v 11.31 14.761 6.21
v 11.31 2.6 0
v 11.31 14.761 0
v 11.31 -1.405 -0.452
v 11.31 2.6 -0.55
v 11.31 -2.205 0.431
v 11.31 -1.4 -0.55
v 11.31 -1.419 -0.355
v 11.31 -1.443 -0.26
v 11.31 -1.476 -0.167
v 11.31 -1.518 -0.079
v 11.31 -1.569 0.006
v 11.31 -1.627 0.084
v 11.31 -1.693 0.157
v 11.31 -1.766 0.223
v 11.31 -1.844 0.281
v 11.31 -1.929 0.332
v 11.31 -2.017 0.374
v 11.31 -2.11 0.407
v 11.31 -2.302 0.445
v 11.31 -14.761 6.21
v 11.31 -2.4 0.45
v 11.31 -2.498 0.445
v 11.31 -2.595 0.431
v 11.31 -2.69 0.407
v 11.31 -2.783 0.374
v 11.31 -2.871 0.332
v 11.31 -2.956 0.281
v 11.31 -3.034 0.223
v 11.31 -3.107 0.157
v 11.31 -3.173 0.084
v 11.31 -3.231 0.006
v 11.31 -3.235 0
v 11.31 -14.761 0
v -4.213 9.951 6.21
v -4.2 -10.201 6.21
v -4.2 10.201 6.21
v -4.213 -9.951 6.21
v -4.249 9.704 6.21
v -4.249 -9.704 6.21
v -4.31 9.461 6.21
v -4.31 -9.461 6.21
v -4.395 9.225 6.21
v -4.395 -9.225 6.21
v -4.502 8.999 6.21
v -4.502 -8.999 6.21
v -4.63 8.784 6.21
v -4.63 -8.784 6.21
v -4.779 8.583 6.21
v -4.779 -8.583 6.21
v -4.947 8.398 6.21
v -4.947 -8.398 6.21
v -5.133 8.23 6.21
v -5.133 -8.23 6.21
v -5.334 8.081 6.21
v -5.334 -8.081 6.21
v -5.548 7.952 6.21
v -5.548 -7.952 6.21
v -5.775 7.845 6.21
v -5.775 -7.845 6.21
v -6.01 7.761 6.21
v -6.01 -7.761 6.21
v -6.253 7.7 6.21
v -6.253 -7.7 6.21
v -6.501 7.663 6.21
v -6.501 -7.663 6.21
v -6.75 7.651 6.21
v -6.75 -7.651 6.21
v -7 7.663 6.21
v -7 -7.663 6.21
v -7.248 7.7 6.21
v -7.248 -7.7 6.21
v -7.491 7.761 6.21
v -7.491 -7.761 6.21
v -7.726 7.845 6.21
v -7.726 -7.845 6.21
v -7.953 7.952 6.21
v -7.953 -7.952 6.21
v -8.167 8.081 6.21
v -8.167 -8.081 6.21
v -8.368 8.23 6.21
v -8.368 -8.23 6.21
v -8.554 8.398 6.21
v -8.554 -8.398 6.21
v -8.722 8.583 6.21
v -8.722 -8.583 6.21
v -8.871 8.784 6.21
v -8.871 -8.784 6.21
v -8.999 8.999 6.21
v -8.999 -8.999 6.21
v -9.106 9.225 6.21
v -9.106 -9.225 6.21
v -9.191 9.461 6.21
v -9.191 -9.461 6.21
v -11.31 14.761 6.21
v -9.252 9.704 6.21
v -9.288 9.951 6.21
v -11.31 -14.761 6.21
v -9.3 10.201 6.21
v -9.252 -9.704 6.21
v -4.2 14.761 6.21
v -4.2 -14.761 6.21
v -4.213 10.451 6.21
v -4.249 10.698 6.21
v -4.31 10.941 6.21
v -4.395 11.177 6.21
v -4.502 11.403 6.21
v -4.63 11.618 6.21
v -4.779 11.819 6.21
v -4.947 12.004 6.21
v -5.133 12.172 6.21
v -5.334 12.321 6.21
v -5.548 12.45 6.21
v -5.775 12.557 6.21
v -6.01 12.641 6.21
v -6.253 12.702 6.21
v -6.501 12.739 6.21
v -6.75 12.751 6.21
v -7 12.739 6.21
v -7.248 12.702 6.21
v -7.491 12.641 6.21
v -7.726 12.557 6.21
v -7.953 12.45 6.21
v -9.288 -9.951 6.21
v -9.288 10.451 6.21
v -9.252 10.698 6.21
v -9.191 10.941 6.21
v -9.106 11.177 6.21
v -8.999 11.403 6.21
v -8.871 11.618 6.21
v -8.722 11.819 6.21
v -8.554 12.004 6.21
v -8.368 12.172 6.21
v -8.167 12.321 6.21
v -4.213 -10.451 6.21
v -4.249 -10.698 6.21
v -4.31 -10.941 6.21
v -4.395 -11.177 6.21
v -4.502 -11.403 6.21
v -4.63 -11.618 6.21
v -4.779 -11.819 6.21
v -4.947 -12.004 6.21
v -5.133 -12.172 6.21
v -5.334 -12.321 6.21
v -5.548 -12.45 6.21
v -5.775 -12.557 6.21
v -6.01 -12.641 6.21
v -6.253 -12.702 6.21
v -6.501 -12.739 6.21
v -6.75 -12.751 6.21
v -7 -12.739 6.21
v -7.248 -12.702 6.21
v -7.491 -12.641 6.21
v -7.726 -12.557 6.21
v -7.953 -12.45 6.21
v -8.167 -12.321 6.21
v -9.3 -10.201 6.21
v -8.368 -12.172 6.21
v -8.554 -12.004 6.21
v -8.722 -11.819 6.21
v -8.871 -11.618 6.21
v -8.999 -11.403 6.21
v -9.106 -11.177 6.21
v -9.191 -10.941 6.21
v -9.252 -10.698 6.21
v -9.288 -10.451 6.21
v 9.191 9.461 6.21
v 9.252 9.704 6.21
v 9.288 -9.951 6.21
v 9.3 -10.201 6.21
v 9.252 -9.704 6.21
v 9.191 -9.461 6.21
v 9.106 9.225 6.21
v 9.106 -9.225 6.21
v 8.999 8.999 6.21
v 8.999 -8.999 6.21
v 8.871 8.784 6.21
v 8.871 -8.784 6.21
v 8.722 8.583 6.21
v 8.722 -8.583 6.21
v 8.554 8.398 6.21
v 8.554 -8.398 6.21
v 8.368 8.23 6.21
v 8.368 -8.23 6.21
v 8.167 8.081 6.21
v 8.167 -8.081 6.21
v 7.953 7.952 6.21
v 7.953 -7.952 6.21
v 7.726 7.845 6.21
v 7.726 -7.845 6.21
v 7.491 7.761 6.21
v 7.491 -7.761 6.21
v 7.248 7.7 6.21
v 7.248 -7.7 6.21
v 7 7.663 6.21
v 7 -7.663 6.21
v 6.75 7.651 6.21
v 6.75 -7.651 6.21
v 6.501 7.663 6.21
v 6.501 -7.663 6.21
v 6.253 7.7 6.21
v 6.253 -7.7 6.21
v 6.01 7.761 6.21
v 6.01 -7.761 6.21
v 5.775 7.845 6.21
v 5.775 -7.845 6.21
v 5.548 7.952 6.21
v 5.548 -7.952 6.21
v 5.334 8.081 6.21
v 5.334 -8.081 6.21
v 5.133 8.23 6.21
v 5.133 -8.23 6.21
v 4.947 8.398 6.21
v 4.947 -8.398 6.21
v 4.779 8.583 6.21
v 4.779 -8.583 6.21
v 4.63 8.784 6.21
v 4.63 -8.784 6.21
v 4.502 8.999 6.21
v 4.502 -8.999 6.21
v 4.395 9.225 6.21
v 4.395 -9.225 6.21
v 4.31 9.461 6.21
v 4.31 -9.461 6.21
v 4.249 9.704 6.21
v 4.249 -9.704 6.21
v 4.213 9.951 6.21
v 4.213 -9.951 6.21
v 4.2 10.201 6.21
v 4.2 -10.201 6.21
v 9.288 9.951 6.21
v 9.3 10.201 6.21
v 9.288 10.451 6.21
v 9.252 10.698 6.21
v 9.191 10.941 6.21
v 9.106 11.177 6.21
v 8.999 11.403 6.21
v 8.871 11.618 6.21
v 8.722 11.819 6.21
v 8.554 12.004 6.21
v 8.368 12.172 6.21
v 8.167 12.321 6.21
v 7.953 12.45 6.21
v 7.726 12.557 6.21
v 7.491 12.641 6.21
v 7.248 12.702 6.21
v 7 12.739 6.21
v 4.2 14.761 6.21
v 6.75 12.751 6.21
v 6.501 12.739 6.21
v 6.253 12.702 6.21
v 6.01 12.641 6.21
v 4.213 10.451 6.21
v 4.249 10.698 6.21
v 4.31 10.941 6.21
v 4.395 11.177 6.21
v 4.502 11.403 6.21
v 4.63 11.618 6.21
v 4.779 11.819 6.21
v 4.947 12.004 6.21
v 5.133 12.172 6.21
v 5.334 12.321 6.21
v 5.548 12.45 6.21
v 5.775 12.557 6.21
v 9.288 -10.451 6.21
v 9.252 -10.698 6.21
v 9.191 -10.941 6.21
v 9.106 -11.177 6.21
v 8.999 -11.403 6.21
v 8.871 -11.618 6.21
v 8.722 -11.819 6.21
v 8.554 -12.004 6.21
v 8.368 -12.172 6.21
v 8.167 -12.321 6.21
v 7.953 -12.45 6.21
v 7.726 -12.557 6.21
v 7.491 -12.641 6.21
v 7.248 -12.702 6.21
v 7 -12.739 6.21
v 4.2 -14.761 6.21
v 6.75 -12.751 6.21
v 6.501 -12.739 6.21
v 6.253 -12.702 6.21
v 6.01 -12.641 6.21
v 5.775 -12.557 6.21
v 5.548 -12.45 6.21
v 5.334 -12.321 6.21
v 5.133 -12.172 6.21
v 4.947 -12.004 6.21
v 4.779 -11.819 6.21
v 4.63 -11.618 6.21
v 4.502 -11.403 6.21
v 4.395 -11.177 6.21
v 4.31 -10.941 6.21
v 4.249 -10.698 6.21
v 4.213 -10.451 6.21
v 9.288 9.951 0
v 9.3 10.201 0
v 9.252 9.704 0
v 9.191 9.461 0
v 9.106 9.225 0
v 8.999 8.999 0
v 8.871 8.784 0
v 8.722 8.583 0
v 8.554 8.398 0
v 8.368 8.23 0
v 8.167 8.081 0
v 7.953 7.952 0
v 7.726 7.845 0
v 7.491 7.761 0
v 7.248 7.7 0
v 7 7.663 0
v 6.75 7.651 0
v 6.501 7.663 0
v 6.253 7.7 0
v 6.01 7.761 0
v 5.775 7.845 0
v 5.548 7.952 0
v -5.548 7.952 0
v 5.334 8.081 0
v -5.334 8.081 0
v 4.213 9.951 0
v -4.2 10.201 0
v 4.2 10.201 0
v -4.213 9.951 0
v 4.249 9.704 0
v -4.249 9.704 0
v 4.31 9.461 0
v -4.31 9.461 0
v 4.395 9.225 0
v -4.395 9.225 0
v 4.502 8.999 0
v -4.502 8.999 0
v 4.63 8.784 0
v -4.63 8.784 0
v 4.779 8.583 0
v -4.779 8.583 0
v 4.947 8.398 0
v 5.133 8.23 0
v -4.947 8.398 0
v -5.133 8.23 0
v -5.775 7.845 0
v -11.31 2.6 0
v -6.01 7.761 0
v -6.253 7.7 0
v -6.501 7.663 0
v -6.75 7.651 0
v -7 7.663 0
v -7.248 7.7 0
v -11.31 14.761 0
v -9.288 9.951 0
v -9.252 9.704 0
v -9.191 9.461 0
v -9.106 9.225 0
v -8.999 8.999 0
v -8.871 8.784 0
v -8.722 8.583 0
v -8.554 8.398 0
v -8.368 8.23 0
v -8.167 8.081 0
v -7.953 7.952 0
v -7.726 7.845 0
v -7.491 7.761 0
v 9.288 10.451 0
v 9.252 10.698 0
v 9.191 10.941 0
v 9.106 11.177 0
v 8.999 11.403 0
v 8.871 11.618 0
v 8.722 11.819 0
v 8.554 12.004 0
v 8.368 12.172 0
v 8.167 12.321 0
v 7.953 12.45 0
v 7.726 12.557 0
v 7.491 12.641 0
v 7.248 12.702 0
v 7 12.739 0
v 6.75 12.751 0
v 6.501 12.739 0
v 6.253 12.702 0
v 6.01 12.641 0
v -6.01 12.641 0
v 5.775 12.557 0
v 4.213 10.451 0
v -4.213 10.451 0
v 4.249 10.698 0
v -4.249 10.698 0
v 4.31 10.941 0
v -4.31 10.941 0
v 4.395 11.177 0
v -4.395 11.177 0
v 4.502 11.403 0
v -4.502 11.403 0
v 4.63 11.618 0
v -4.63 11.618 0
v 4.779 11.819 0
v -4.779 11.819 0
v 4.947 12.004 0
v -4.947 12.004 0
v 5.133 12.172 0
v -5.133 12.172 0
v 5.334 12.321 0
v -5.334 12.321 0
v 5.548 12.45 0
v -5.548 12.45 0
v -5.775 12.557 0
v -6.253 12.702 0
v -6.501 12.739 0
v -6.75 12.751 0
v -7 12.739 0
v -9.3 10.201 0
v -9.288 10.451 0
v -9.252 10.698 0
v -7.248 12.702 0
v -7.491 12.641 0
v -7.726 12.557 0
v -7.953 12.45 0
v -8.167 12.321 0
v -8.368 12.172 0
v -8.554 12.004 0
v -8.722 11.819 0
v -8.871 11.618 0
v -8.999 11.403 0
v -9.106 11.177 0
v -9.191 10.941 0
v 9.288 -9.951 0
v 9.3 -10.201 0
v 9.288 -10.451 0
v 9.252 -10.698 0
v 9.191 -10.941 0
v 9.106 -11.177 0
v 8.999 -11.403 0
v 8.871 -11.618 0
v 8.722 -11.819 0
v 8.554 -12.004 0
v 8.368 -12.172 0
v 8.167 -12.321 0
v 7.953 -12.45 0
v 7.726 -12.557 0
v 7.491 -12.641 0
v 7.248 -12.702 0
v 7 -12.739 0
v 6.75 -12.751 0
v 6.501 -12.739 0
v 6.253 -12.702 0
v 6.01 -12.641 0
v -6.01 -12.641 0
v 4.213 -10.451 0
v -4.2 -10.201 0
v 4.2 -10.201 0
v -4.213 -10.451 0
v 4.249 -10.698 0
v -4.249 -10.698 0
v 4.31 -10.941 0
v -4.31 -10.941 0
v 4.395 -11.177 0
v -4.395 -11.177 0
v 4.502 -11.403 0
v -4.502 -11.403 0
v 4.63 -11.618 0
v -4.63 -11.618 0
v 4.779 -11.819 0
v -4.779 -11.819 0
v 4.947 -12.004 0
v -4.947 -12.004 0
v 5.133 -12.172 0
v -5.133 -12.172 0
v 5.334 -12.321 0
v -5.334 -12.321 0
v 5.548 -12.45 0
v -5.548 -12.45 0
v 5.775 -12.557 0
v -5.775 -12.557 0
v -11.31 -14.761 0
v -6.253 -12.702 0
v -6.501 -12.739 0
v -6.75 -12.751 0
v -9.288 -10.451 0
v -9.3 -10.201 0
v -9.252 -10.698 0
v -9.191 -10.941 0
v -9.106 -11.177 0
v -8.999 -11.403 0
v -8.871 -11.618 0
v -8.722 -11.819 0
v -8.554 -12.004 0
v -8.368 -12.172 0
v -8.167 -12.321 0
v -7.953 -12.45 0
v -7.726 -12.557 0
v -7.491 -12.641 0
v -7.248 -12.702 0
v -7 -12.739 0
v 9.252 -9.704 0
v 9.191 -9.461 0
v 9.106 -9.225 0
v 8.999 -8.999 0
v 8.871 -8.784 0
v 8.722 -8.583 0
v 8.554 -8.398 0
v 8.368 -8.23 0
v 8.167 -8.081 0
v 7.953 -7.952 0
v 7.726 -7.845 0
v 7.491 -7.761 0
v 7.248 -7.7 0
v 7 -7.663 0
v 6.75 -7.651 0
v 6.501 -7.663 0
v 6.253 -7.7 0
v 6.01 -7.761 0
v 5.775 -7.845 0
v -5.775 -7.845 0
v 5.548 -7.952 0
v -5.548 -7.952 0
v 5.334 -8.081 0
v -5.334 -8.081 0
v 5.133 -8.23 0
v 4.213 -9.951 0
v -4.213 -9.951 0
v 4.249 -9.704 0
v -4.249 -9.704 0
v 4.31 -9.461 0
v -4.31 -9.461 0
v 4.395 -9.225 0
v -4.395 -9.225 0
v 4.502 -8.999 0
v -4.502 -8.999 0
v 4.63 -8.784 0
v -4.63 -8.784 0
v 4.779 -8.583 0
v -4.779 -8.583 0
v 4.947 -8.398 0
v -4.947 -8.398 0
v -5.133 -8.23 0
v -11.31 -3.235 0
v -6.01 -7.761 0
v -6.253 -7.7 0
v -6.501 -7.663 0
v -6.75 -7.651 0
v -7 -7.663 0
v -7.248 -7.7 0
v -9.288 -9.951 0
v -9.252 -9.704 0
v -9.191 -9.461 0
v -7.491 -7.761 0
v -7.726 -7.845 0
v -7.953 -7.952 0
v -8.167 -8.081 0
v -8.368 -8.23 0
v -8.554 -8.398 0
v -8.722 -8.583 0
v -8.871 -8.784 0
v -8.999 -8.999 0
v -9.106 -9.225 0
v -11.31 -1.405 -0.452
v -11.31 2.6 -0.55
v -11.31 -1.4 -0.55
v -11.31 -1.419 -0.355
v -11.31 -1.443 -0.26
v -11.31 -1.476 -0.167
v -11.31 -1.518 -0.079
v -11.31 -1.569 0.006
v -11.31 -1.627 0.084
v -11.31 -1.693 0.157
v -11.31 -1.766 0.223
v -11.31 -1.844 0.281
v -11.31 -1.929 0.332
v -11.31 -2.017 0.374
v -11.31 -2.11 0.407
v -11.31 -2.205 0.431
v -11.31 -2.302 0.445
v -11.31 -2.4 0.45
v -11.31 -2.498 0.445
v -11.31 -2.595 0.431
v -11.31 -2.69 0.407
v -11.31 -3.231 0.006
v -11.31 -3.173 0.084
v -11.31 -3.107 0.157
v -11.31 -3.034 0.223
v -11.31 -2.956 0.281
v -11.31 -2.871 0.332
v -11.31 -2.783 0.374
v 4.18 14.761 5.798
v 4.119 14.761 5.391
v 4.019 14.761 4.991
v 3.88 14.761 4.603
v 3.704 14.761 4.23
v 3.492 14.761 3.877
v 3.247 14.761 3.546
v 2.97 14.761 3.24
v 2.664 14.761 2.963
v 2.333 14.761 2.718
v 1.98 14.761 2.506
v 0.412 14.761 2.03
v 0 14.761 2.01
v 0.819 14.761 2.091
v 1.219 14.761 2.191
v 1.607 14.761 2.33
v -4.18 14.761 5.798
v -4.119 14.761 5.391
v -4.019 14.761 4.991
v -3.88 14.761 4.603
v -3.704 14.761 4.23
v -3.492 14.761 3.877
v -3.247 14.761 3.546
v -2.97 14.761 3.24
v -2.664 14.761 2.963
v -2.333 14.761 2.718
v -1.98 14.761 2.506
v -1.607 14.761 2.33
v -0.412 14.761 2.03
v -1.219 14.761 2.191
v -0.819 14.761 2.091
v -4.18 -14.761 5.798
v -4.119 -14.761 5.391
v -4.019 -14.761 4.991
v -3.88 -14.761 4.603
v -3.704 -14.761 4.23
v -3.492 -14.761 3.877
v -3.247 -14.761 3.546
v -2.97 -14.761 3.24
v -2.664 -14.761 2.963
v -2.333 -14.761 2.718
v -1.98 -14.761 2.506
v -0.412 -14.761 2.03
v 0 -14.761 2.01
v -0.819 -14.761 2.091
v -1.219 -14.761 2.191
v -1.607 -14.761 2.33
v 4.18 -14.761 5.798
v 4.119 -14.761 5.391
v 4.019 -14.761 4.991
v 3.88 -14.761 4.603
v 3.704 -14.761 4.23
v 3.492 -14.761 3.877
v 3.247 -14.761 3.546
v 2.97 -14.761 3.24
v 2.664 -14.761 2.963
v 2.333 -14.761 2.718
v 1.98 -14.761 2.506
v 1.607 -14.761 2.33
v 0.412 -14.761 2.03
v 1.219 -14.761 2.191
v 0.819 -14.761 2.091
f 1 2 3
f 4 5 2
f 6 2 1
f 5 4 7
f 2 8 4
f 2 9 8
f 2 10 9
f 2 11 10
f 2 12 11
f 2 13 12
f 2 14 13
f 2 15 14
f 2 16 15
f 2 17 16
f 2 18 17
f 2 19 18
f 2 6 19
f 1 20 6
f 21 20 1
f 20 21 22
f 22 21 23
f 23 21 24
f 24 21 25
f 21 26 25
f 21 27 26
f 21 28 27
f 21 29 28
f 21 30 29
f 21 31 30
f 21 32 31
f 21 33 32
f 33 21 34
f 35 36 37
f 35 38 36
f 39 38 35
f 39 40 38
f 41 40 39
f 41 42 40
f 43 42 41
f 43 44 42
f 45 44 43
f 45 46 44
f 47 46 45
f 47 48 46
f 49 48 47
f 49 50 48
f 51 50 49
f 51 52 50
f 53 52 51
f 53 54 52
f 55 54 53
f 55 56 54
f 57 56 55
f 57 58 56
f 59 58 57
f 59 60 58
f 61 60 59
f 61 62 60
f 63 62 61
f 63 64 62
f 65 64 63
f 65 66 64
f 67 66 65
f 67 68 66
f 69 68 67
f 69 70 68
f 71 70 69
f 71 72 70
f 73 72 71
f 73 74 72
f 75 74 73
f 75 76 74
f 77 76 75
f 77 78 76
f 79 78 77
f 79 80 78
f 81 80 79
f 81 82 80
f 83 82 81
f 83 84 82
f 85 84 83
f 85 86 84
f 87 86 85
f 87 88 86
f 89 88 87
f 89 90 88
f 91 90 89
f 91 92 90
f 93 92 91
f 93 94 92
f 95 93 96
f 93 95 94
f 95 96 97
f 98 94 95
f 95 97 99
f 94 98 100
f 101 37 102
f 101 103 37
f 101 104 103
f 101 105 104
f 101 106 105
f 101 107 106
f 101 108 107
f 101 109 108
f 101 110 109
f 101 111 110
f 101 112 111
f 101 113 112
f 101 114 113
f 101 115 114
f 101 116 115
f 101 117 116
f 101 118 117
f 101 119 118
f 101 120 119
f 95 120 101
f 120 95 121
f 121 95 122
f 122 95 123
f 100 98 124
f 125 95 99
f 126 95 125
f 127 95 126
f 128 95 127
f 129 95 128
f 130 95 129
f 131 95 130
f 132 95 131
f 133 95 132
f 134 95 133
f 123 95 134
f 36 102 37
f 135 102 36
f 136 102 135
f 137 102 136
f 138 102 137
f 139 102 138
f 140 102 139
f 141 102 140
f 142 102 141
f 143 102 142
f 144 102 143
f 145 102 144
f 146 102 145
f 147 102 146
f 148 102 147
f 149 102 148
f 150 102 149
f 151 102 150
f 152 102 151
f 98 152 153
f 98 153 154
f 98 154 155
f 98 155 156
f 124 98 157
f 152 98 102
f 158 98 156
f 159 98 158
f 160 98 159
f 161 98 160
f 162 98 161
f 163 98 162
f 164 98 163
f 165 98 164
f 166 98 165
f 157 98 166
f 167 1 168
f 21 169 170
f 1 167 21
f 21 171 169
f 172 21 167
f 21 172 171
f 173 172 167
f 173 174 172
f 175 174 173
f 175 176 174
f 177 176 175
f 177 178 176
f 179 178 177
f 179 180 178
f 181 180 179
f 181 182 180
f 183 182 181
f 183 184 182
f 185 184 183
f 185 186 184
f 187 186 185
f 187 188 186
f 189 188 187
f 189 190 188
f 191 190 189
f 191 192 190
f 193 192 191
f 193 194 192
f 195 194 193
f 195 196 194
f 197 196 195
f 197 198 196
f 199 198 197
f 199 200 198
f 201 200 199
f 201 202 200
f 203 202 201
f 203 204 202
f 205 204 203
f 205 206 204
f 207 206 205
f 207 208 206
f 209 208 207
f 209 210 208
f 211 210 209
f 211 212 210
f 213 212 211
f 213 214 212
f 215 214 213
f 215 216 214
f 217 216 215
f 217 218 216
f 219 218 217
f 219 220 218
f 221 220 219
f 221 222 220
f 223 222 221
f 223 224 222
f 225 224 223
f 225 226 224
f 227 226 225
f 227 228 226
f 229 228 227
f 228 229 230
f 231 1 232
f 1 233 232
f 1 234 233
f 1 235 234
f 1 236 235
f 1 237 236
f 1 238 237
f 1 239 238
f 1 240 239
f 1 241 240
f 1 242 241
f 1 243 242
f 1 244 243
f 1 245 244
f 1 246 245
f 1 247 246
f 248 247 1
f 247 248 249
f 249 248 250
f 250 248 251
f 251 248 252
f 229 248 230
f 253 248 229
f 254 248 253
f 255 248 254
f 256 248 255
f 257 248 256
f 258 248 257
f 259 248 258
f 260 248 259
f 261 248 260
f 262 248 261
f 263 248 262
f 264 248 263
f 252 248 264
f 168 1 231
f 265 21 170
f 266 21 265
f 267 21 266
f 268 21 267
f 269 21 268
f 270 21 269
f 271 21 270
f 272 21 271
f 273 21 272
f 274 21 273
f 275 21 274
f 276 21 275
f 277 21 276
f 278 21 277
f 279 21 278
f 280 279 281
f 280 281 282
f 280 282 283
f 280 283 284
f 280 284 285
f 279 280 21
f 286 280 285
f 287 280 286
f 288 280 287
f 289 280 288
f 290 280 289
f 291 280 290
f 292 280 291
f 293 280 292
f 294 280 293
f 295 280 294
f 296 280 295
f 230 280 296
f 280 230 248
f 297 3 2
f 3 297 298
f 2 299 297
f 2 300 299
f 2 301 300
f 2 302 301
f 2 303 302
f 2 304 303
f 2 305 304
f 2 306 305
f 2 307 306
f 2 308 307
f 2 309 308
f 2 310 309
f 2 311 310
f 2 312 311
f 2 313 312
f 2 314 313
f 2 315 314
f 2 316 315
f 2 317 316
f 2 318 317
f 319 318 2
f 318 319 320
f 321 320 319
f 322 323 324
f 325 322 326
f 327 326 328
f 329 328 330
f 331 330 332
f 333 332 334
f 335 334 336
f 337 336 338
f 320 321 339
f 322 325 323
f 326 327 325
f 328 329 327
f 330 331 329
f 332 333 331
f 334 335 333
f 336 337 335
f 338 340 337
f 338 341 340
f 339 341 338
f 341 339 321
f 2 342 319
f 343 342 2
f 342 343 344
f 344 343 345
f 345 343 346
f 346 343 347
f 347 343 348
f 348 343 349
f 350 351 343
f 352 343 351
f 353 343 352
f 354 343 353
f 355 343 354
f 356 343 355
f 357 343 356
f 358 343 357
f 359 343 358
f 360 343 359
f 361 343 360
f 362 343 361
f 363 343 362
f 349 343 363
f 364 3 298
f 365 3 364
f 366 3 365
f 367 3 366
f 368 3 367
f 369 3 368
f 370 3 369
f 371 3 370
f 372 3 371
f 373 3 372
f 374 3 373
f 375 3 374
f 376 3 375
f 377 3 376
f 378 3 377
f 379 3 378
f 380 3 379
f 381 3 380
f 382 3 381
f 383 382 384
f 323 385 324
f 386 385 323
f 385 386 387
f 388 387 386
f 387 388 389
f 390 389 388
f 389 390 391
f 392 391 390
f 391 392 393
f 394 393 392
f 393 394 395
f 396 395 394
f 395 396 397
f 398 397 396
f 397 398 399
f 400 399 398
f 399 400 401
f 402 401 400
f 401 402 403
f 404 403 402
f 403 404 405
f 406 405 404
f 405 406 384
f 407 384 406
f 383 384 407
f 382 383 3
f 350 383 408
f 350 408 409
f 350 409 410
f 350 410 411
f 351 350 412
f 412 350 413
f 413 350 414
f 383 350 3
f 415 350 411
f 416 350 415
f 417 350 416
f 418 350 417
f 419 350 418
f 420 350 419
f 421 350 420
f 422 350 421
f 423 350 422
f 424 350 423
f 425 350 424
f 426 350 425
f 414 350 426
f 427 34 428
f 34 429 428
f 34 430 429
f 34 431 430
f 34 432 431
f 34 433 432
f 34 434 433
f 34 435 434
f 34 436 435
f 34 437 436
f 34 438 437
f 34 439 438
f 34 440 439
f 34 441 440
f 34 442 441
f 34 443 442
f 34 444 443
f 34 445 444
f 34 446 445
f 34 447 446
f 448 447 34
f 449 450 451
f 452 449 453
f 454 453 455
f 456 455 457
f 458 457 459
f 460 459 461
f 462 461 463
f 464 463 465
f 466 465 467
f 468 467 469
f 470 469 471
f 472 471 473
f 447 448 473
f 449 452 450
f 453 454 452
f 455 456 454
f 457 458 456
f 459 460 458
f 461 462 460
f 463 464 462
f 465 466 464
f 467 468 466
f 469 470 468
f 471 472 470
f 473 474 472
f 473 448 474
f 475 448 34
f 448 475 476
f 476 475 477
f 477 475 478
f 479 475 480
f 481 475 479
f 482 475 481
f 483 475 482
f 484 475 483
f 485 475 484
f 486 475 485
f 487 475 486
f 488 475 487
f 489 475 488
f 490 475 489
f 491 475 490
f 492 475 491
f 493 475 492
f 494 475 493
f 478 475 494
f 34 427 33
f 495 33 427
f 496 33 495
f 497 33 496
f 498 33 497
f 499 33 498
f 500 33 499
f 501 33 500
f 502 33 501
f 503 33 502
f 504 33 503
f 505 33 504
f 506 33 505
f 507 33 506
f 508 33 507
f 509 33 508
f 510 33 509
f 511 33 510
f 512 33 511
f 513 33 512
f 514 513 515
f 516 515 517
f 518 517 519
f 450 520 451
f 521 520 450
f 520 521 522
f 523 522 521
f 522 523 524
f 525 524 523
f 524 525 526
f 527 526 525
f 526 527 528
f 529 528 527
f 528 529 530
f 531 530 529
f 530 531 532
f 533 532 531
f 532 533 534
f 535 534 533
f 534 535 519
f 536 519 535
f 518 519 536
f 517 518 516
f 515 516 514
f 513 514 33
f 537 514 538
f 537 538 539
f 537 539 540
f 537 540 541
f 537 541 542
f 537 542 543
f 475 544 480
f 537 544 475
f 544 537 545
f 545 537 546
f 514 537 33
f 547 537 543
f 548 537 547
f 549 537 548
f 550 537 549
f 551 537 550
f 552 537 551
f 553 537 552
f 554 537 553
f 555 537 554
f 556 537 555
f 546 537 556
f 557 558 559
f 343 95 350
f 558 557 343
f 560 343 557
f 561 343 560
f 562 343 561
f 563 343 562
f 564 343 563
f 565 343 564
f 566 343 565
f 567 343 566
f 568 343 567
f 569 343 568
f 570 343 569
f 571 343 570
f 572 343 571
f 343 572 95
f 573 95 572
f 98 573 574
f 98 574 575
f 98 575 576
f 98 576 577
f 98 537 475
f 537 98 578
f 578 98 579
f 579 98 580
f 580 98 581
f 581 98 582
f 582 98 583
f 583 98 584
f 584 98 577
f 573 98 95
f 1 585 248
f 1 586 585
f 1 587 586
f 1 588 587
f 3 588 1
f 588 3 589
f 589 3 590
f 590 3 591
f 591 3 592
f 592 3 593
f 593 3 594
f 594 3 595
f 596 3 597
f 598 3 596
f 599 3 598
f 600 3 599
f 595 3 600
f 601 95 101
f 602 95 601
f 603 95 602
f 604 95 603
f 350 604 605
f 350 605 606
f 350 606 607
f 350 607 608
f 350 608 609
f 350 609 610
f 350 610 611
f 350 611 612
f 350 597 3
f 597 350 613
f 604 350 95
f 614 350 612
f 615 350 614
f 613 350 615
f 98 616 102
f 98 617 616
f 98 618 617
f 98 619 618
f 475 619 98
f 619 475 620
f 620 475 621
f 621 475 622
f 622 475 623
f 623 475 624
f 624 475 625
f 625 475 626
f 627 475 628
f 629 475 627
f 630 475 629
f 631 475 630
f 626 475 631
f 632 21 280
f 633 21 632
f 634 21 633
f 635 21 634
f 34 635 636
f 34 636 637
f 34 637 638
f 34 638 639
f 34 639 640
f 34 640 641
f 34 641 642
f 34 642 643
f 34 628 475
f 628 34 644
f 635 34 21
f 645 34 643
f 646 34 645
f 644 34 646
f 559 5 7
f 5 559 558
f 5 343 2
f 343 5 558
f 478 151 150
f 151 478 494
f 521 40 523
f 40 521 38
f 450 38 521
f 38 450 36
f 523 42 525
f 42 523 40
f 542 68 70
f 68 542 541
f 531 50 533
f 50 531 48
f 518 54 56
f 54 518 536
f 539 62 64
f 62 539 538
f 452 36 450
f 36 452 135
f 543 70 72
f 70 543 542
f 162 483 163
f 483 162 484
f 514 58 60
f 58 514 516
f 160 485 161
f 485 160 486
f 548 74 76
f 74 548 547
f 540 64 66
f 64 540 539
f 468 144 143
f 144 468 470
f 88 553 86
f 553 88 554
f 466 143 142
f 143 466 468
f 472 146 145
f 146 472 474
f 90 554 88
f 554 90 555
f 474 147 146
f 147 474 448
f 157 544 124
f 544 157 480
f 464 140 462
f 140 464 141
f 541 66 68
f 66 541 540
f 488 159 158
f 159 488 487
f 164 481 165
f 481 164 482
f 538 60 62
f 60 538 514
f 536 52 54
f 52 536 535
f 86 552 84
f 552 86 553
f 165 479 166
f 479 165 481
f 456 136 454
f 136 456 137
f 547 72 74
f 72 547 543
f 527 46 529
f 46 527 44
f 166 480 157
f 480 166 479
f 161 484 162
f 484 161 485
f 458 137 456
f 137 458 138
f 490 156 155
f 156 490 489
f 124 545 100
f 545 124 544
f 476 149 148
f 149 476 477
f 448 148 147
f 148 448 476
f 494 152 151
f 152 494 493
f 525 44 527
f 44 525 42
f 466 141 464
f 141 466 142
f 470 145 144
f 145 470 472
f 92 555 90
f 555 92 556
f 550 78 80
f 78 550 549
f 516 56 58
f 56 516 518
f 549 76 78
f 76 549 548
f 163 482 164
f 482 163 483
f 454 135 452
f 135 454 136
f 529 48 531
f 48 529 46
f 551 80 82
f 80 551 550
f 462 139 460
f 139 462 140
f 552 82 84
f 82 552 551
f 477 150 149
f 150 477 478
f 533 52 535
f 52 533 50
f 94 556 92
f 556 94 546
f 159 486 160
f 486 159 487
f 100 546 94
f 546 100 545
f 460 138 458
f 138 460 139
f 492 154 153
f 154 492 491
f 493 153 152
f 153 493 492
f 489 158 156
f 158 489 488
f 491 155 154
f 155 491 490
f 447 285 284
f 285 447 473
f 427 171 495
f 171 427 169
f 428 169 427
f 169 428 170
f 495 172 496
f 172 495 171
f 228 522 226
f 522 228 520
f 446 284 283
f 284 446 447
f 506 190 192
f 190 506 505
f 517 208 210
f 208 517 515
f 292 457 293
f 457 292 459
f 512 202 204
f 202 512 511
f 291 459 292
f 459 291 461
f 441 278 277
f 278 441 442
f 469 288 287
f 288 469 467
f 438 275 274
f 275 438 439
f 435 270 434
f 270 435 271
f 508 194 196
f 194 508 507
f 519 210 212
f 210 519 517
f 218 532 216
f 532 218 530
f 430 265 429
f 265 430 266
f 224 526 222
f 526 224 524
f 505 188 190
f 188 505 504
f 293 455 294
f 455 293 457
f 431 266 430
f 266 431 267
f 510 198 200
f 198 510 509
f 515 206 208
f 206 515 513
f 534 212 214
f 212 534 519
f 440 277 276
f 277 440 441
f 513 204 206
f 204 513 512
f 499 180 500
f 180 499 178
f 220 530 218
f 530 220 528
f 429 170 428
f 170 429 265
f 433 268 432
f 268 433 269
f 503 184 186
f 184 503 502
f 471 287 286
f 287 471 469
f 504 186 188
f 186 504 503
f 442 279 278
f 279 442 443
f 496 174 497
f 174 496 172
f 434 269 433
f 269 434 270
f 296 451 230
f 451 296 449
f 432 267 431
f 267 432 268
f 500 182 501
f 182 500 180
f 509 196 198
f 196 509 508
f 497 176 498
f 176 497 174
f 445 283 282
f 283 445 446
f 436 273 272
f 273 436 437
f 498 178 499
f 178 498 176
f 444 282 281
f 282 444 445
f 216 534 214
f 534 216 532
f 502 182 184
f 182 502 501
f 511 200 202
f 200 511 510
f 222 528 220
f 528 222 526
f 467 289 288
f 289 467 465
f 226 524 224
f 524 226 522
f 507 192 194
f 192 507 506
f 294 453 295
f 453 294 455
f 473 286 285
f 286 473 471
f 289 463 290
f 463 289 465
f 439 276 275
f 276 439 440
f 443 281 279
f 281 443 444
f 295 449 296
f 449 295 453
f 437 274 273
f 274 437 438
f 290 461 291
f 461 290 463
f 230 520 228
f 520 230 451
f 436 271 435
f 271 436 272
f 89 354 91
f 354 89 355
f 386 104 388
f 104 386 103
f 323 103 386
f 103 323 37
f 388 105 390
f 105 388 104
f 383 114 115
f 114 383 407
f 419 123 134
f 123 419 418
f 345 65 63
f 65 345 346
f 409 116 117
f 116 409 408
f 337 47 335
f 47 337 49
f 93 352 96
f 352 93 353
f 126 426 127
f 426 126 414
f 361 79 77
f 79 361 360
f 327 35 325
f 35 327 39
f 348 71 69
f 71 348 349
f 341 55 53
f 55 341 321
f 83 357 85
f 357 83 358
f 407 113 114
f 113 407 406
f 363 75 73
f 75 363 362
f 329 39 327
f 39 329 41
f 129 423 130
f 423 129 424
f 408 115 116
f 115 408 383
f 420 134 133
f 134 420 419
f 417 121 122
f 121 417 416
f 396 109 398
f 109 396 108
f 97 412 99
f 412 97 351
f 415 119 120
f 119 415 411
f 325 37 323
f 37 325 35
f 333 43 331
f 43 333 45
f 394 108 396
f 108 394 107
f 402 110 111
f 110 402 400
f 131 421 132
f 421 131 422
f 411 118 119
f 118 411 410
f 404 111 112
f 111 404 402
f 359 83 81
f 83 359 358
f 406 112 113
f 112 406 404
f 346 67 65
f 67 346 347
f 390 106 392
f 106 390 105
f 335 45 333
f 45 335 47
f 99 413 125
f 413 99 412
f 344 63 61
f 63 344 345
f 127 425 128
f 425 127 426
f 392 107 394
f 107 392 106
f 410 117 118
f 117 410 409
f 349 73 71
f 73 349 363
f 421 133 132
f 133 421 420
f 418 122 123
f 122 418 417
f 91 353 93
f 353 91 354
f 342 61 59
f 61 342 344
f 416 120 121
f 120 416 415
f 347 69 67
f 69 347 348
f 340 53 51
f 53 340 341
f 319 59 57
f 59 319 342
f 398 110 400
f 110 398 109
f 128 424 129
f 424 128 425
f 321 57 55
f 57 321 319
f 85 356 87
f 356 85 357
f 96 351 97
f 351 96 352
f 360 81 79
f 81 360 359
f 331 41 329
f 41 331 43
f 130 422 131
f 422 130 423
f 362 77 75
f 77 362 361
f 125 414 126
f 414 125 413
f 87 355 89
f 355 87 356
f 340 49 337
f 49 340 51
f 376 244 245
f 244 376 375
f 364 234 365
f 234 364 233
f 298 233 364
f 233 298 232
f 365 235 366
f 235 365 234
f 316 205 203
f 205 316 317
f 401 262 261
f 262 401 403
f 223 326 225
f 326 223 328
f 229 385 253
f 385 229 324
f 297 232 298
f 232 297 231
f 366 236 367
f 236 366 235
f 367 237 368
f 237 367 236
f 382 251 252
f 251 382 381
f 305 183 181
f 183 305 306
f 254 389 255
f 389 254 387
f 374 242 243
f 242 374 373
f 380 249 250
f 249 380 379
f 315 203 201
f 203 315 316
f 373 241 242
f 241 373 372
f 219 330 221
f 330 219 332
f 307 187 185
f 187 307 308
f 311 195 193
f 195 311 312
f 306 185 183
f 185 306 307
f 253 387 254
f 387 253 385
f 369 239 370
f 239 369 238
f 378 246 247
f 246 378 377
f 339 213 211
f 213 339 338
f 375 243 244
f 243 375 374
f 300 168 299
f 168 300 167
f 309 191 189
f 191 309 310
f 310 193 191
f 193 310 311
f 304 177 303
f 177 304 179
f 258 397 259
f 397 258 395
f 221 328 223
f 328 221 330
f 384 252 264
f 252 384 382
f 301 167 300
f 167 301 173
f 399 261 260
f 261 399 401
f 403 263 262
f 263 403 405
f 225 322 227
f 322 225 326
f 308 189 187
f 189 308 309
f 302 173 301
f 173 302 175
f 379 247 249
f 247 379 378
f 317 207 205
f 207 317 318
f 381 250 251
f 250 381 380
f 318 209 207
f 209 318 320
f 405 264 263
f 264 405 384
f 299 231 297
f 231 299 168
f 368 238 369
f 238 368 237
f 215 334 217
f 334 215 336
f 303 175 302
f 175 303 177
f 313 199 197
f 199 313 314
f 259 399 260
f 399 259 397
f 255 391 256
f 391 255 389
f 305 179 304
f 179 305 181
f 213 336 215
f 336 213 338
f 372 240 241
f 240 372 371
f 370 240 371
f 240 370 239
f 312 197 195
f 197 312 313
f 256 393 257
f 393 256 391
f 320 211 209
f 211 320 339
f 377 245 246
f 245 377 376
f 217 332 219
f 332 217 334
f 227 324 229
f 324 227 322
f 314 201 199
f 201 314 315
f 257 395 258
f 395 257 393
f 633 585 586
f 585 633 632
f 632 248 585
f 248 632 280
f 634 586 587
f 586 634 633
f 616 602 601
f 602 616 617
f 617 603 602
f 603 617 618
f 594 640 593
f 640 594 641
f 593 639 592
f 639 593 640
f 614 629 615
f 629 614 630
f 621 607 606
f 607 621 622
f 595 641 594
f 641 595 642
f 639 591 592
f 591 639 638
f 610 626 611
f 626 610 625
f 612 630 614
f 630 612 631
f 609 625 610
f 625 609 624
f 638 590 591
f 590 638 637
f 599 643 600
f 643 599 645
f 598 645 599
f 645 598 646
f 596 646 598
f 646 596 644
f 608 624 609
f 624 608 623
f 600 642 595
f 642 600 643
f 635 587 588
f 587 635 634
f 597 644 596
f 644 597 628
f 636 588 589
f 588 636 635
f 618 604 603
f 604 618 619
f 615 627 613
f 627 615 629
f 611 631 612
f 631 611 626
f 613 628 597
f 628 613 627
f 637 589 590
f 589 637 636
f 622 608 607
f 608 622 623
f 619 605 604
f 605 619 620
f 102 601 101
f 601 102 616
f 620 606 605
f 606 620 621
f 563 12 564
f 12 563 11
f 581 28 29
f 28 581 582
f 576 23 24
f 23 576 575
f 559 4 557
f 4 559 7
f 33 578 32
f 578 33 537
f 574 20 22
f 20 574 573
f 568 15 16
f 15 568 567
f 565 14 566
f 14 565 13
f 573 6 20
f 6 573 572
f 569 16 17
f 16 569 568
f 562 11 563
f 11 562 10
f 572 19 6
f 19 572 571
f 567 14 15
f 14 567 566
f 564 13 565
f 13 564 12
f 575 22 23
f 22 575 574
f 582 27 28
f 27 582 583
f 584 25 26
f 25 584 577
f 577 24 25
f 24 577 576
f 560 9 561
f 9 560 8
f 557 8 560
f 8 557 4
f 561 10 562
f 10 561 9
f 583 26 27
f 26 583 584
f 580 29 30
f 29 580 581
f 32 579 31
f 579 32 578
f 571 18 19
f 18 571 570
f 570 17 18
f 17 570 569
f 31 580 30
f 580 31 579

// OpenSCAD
// file: configuration.scad
/*
 * Igor Soares' parallel kinematic XY
 * Configuration
 * (C) 2014 by Ígor Bruno Pereira Soares
 *
 * This project is free: you can redistribute it and/or modify
 * it under the terms of the GNU General Public License as published by
 * the Free Software Foundation, either version 2 of the License, or
 * (at your option) any later version.
 *
 * This project is distributed in the hope that it will be useful,
 * but WITHOUT ANY WARRANTY; without even the implied warranty of
 * MERCHANTABILITY or FITNESS FOR A PARTICULAR PURPOSE.  See the
 * GNU General Public License for more details.
 *
 * You should have received a copy of the GNU General Public License
 * along with this project.  If not, see <http://www.gnu.org/licenses/>.
 */

LIGHT_WALL_WIDTH = 2.01;
WALL_WIDTH = 5.0;
VERTICAL_SUPPORT_WALL = 0.5;
HORIZONTAL_SUPPORT_WALL = 0.255;

BEARING_DIAMETER = 22.4;
BEARING_WIDTH = 7;
BEARING_SCREW_DIAMETER = 8.2;
BEARING_SCREW_NUT_WIDTH = 13;

LINEAR_BUSHING_DIAMETER = 15.3;
LINEAR_BUSHING_LEN = 24.4;
LINEAR_BUSHING_WALL = 1.0;

INNER_BEARING_SCREW_DISTANCE_TO_ROD = VERTICAL_SUPPORT_WALL;
INNER_BEARING_POS = 15;

SPACING_TO_BEARING = 18.0;
ROD_ACTUAL_DIAMETER = 8.0;
ROD_HOLE_DIAMETER = 8.4;

ROD_CLAMP_SCREW_DIAMETER = 4.8+ 0.3;
ROD_CLAMP_SCREW_NUT_WIDTH = 6.7;
ROD_CLAMP_SCREW_NUT_H = 3.5;
ROD_CLAMP_GAP = 1.0;

FRAME_ROD_DIAMETER = 8.4;
FRAME_VERTICE_WALL_WIDTH = 3.5;

WIRE_END_SCREW_DIAMETER = 4.8 + 0.3; // 3/16 + tolerance

MOTOR_SCREW_DIAMETER = 3.4;
MOTOR_SCREW_MOUNT = 31; // nema 17
MOTOR_SIZE = 43;
MOTOR_MOUNT_INNER_DIAMETER = 30;
MOTOR_BELT_CLEARANCE = 5;

MOTOR_SUPPORT_SCREW_DIAMETER = 4.8 + 0.3; // 3/16 + tolerance
MOTOR_SUPPORT_SCREWS_DISTANCE = 40;

BEARING_GUIDE_H = 7;
BEARING_GUIDE_ANGLE = 30;

ST = 0.001;
// main file
/*
 * Igor Soares' parallel kinematic XY
 * Sliding block
 * (C) 2014 by Ígor Bruno Pereira Soares
 *
 * This project is free: you can redistribute it and/or modify
 * it under the terms of the GNU General Public License as published by
 * the Free Software Foundation, either version 2 of the License, or
 * (at your option) any later version.
 *
 * This project is distributed in the hope that it will be useful,
 * but WITHOUT ANY WARRANTY; without even the implied warranty of
 * MERCHANTABILITY or FITNESS FOR A PARTICULAR PURPOSE.  See the
 * GNU General Public License for more details.
 *
 * You should have received a copy of the GNU General Public License
 * along with this project.  If not, see <http://www.gnu.org/licenses/>.
 */

include <configuration.scad>

sliding_block_rod_clamp($fn=64);

module sliding_block_rod_clamp(
    wall=WALL_WIDTH,
    lwall=LIGHT_WALL_WIDTH,
    rod_r=ROD_HOLE_DIAMETER/2,
    bearing_pos=INNER_BEARING_SCREW_DISTANCE_TO_ROD,
    bearing_r=BEARING_DIAMETER/2,
    bearing_screw_r=BEARING_SCREW_DIAMETER/2,
    bearing_screw_rod_d=INNER_BEARING_SCREW_DISTANCE_TO_ROD,
    screw_r=ROD_CLAMP_SCREW_DIAMETER/2,
    bushing_r=LINEAR_BUSHING_DIAMETER/2,
    bushing_l=LINEAR_BUSHING_LEN,
    wire_pos_from_bearing_center=BEARING_DIAMETER/2,
    wire_h=LIGHT_WALL_WIDTH + BEARING_WIDTH/2 + 0.5)
{
  h=rod_r + lwall;

  wire_h_pos = lwall - (wire_h + (rod_r - bushing_r));

  bearing_pos = (rod_r + bearing_screw_rod_d + bearing_screw_r) - 2*bearing_r;

  screws_y_dist = bushing_r + screw_r + ST;
  wire_y_pos = bearing_pos + wire_pos_from_bearing_center;
  left_pos = min(bearing_pos + wire_pos_from_bearing_center,
                 -screws_y_dist - screw_r - lwall);

  screws_x_dist = 2*rod_r + 2*screw_r + ST;
  x_len = screws_x_dist + 2*screw_r + 2*lwall;

  y_len = screws_y_dist + screw_r + lwall - left_pos;

  screw_pos = [ -x_len/2 + lwall + screw_r, lwall + screw_r];

  difference() {
    union() {
      translate([-x_len/2, left_pos, 0])
        cube([x_len, y_len, h]);
      translate([-x_len/2, wire_y_pos, wire_h_pos])
        cube([x_len, wall, h]);
    }
    //rod
    translate([0, left_pos -1, lwall + rod_r]) rotate([-90,0,0])
      #cylinder(r=rod_r, h=y_len +2);

    //screws
    for (f=[ [0,-1], [1,-1], [0,1], [1,1] ])
      translate([screw_pos[0] + f[0]*screws_x_dist,
                 f[1]*screws_y_dist,
                 -1])
        #cylinder(r=screw_r, h=h+2);

      translate([-x_len/2 -1, wire_y_pos, wire_h_pos]) rotate([0,90,0])
        #cylinder(r=1, h=x_len +2);
  }
}

module sliding_block_bushing_clamp(
    wall=WALL_WIDTH,
    lwall=LIGHT_WALL_WIDTH,
    rod_r=ROD_HOLE_DIAMETER/2,
    bearing_pos=INNER_BEARING_SCREW_DISTANCE_TO_ROD,
    bearing_r=BEARING_SCREW_DIAMETER/2,
    screw_r=ROD_CLAMP_SCREW_DIAMETER/2,
    bushing_r=LINEAR_BUSHING_DIAMETER/2,
    bushing_l=LINEAR_BUSHING_LEN,
    bushing_wall=LINEAR_BUSHING_WALL)
{
  h=wall + lwall;

  screws_x_dist = 2*rod_r + 2*screw_r + ST;
  x_len = screws_x_dist + 2*screw_r + 2*lwall;
  x_len_bushing = bushing_l + 2*lwall;
  x_len_total = max(x_len, x_len_bushing);

  screws_y_dist = 2*bushing_r + 2*screw_r + ST;
  y_len = screws_y_dist + 2*screw_r + 2*lwall;

  screw_pos = [ -x_len/2 + lwall + screw_r, lwall + screw_r];
  bushing_encl_r= bushing_r + lwall;

  difference() {
    union() {
      translate([-x_len/2, 0, 0])
        cube([x_len, y_len, h]);

      translate([-x_len/2, y_len/2 - bushing_encl_r*cos(45), 0])
        cube([x_len_total, 2*bushing_encl_r*cos(45), h]);

      intersection() {
        translate([-x_len/2, 0, 0])
          cube([bushing_l + 2*lwall, y_len, h]);
        translate([-x_len/2 -1, y_len/2, lwall + bushing_r]) rotate([0,90,0])
          cylinder(r=bushing_encl_r, h=x_len_bushing +2);
      }
    }
    //bushing
    translate([-x_len/2 -1, y_len/2, lwall + bushing_r]) rotate([0,90,0])
      #cylinder(r=bushing_r - bushing_wall, h=x_len_total +2);
    translate([-x_len/2 + lwall, y_len/2, lwall + bushing_r]) rotate([0,90,0])
      #cylinder(r=bushing_r, h=bushing_l);

    //screws
    for (f=[ [0,0], [1,0], [0,1], [1,1] ])
      translate([screw_pos[0] + f[0]*screws_x_dist,
                 screw_pos[1] + f[1]*screws_y_dist,
                 -1])
        #cylinder(r=screw_r, h=h+2);
  }
}
